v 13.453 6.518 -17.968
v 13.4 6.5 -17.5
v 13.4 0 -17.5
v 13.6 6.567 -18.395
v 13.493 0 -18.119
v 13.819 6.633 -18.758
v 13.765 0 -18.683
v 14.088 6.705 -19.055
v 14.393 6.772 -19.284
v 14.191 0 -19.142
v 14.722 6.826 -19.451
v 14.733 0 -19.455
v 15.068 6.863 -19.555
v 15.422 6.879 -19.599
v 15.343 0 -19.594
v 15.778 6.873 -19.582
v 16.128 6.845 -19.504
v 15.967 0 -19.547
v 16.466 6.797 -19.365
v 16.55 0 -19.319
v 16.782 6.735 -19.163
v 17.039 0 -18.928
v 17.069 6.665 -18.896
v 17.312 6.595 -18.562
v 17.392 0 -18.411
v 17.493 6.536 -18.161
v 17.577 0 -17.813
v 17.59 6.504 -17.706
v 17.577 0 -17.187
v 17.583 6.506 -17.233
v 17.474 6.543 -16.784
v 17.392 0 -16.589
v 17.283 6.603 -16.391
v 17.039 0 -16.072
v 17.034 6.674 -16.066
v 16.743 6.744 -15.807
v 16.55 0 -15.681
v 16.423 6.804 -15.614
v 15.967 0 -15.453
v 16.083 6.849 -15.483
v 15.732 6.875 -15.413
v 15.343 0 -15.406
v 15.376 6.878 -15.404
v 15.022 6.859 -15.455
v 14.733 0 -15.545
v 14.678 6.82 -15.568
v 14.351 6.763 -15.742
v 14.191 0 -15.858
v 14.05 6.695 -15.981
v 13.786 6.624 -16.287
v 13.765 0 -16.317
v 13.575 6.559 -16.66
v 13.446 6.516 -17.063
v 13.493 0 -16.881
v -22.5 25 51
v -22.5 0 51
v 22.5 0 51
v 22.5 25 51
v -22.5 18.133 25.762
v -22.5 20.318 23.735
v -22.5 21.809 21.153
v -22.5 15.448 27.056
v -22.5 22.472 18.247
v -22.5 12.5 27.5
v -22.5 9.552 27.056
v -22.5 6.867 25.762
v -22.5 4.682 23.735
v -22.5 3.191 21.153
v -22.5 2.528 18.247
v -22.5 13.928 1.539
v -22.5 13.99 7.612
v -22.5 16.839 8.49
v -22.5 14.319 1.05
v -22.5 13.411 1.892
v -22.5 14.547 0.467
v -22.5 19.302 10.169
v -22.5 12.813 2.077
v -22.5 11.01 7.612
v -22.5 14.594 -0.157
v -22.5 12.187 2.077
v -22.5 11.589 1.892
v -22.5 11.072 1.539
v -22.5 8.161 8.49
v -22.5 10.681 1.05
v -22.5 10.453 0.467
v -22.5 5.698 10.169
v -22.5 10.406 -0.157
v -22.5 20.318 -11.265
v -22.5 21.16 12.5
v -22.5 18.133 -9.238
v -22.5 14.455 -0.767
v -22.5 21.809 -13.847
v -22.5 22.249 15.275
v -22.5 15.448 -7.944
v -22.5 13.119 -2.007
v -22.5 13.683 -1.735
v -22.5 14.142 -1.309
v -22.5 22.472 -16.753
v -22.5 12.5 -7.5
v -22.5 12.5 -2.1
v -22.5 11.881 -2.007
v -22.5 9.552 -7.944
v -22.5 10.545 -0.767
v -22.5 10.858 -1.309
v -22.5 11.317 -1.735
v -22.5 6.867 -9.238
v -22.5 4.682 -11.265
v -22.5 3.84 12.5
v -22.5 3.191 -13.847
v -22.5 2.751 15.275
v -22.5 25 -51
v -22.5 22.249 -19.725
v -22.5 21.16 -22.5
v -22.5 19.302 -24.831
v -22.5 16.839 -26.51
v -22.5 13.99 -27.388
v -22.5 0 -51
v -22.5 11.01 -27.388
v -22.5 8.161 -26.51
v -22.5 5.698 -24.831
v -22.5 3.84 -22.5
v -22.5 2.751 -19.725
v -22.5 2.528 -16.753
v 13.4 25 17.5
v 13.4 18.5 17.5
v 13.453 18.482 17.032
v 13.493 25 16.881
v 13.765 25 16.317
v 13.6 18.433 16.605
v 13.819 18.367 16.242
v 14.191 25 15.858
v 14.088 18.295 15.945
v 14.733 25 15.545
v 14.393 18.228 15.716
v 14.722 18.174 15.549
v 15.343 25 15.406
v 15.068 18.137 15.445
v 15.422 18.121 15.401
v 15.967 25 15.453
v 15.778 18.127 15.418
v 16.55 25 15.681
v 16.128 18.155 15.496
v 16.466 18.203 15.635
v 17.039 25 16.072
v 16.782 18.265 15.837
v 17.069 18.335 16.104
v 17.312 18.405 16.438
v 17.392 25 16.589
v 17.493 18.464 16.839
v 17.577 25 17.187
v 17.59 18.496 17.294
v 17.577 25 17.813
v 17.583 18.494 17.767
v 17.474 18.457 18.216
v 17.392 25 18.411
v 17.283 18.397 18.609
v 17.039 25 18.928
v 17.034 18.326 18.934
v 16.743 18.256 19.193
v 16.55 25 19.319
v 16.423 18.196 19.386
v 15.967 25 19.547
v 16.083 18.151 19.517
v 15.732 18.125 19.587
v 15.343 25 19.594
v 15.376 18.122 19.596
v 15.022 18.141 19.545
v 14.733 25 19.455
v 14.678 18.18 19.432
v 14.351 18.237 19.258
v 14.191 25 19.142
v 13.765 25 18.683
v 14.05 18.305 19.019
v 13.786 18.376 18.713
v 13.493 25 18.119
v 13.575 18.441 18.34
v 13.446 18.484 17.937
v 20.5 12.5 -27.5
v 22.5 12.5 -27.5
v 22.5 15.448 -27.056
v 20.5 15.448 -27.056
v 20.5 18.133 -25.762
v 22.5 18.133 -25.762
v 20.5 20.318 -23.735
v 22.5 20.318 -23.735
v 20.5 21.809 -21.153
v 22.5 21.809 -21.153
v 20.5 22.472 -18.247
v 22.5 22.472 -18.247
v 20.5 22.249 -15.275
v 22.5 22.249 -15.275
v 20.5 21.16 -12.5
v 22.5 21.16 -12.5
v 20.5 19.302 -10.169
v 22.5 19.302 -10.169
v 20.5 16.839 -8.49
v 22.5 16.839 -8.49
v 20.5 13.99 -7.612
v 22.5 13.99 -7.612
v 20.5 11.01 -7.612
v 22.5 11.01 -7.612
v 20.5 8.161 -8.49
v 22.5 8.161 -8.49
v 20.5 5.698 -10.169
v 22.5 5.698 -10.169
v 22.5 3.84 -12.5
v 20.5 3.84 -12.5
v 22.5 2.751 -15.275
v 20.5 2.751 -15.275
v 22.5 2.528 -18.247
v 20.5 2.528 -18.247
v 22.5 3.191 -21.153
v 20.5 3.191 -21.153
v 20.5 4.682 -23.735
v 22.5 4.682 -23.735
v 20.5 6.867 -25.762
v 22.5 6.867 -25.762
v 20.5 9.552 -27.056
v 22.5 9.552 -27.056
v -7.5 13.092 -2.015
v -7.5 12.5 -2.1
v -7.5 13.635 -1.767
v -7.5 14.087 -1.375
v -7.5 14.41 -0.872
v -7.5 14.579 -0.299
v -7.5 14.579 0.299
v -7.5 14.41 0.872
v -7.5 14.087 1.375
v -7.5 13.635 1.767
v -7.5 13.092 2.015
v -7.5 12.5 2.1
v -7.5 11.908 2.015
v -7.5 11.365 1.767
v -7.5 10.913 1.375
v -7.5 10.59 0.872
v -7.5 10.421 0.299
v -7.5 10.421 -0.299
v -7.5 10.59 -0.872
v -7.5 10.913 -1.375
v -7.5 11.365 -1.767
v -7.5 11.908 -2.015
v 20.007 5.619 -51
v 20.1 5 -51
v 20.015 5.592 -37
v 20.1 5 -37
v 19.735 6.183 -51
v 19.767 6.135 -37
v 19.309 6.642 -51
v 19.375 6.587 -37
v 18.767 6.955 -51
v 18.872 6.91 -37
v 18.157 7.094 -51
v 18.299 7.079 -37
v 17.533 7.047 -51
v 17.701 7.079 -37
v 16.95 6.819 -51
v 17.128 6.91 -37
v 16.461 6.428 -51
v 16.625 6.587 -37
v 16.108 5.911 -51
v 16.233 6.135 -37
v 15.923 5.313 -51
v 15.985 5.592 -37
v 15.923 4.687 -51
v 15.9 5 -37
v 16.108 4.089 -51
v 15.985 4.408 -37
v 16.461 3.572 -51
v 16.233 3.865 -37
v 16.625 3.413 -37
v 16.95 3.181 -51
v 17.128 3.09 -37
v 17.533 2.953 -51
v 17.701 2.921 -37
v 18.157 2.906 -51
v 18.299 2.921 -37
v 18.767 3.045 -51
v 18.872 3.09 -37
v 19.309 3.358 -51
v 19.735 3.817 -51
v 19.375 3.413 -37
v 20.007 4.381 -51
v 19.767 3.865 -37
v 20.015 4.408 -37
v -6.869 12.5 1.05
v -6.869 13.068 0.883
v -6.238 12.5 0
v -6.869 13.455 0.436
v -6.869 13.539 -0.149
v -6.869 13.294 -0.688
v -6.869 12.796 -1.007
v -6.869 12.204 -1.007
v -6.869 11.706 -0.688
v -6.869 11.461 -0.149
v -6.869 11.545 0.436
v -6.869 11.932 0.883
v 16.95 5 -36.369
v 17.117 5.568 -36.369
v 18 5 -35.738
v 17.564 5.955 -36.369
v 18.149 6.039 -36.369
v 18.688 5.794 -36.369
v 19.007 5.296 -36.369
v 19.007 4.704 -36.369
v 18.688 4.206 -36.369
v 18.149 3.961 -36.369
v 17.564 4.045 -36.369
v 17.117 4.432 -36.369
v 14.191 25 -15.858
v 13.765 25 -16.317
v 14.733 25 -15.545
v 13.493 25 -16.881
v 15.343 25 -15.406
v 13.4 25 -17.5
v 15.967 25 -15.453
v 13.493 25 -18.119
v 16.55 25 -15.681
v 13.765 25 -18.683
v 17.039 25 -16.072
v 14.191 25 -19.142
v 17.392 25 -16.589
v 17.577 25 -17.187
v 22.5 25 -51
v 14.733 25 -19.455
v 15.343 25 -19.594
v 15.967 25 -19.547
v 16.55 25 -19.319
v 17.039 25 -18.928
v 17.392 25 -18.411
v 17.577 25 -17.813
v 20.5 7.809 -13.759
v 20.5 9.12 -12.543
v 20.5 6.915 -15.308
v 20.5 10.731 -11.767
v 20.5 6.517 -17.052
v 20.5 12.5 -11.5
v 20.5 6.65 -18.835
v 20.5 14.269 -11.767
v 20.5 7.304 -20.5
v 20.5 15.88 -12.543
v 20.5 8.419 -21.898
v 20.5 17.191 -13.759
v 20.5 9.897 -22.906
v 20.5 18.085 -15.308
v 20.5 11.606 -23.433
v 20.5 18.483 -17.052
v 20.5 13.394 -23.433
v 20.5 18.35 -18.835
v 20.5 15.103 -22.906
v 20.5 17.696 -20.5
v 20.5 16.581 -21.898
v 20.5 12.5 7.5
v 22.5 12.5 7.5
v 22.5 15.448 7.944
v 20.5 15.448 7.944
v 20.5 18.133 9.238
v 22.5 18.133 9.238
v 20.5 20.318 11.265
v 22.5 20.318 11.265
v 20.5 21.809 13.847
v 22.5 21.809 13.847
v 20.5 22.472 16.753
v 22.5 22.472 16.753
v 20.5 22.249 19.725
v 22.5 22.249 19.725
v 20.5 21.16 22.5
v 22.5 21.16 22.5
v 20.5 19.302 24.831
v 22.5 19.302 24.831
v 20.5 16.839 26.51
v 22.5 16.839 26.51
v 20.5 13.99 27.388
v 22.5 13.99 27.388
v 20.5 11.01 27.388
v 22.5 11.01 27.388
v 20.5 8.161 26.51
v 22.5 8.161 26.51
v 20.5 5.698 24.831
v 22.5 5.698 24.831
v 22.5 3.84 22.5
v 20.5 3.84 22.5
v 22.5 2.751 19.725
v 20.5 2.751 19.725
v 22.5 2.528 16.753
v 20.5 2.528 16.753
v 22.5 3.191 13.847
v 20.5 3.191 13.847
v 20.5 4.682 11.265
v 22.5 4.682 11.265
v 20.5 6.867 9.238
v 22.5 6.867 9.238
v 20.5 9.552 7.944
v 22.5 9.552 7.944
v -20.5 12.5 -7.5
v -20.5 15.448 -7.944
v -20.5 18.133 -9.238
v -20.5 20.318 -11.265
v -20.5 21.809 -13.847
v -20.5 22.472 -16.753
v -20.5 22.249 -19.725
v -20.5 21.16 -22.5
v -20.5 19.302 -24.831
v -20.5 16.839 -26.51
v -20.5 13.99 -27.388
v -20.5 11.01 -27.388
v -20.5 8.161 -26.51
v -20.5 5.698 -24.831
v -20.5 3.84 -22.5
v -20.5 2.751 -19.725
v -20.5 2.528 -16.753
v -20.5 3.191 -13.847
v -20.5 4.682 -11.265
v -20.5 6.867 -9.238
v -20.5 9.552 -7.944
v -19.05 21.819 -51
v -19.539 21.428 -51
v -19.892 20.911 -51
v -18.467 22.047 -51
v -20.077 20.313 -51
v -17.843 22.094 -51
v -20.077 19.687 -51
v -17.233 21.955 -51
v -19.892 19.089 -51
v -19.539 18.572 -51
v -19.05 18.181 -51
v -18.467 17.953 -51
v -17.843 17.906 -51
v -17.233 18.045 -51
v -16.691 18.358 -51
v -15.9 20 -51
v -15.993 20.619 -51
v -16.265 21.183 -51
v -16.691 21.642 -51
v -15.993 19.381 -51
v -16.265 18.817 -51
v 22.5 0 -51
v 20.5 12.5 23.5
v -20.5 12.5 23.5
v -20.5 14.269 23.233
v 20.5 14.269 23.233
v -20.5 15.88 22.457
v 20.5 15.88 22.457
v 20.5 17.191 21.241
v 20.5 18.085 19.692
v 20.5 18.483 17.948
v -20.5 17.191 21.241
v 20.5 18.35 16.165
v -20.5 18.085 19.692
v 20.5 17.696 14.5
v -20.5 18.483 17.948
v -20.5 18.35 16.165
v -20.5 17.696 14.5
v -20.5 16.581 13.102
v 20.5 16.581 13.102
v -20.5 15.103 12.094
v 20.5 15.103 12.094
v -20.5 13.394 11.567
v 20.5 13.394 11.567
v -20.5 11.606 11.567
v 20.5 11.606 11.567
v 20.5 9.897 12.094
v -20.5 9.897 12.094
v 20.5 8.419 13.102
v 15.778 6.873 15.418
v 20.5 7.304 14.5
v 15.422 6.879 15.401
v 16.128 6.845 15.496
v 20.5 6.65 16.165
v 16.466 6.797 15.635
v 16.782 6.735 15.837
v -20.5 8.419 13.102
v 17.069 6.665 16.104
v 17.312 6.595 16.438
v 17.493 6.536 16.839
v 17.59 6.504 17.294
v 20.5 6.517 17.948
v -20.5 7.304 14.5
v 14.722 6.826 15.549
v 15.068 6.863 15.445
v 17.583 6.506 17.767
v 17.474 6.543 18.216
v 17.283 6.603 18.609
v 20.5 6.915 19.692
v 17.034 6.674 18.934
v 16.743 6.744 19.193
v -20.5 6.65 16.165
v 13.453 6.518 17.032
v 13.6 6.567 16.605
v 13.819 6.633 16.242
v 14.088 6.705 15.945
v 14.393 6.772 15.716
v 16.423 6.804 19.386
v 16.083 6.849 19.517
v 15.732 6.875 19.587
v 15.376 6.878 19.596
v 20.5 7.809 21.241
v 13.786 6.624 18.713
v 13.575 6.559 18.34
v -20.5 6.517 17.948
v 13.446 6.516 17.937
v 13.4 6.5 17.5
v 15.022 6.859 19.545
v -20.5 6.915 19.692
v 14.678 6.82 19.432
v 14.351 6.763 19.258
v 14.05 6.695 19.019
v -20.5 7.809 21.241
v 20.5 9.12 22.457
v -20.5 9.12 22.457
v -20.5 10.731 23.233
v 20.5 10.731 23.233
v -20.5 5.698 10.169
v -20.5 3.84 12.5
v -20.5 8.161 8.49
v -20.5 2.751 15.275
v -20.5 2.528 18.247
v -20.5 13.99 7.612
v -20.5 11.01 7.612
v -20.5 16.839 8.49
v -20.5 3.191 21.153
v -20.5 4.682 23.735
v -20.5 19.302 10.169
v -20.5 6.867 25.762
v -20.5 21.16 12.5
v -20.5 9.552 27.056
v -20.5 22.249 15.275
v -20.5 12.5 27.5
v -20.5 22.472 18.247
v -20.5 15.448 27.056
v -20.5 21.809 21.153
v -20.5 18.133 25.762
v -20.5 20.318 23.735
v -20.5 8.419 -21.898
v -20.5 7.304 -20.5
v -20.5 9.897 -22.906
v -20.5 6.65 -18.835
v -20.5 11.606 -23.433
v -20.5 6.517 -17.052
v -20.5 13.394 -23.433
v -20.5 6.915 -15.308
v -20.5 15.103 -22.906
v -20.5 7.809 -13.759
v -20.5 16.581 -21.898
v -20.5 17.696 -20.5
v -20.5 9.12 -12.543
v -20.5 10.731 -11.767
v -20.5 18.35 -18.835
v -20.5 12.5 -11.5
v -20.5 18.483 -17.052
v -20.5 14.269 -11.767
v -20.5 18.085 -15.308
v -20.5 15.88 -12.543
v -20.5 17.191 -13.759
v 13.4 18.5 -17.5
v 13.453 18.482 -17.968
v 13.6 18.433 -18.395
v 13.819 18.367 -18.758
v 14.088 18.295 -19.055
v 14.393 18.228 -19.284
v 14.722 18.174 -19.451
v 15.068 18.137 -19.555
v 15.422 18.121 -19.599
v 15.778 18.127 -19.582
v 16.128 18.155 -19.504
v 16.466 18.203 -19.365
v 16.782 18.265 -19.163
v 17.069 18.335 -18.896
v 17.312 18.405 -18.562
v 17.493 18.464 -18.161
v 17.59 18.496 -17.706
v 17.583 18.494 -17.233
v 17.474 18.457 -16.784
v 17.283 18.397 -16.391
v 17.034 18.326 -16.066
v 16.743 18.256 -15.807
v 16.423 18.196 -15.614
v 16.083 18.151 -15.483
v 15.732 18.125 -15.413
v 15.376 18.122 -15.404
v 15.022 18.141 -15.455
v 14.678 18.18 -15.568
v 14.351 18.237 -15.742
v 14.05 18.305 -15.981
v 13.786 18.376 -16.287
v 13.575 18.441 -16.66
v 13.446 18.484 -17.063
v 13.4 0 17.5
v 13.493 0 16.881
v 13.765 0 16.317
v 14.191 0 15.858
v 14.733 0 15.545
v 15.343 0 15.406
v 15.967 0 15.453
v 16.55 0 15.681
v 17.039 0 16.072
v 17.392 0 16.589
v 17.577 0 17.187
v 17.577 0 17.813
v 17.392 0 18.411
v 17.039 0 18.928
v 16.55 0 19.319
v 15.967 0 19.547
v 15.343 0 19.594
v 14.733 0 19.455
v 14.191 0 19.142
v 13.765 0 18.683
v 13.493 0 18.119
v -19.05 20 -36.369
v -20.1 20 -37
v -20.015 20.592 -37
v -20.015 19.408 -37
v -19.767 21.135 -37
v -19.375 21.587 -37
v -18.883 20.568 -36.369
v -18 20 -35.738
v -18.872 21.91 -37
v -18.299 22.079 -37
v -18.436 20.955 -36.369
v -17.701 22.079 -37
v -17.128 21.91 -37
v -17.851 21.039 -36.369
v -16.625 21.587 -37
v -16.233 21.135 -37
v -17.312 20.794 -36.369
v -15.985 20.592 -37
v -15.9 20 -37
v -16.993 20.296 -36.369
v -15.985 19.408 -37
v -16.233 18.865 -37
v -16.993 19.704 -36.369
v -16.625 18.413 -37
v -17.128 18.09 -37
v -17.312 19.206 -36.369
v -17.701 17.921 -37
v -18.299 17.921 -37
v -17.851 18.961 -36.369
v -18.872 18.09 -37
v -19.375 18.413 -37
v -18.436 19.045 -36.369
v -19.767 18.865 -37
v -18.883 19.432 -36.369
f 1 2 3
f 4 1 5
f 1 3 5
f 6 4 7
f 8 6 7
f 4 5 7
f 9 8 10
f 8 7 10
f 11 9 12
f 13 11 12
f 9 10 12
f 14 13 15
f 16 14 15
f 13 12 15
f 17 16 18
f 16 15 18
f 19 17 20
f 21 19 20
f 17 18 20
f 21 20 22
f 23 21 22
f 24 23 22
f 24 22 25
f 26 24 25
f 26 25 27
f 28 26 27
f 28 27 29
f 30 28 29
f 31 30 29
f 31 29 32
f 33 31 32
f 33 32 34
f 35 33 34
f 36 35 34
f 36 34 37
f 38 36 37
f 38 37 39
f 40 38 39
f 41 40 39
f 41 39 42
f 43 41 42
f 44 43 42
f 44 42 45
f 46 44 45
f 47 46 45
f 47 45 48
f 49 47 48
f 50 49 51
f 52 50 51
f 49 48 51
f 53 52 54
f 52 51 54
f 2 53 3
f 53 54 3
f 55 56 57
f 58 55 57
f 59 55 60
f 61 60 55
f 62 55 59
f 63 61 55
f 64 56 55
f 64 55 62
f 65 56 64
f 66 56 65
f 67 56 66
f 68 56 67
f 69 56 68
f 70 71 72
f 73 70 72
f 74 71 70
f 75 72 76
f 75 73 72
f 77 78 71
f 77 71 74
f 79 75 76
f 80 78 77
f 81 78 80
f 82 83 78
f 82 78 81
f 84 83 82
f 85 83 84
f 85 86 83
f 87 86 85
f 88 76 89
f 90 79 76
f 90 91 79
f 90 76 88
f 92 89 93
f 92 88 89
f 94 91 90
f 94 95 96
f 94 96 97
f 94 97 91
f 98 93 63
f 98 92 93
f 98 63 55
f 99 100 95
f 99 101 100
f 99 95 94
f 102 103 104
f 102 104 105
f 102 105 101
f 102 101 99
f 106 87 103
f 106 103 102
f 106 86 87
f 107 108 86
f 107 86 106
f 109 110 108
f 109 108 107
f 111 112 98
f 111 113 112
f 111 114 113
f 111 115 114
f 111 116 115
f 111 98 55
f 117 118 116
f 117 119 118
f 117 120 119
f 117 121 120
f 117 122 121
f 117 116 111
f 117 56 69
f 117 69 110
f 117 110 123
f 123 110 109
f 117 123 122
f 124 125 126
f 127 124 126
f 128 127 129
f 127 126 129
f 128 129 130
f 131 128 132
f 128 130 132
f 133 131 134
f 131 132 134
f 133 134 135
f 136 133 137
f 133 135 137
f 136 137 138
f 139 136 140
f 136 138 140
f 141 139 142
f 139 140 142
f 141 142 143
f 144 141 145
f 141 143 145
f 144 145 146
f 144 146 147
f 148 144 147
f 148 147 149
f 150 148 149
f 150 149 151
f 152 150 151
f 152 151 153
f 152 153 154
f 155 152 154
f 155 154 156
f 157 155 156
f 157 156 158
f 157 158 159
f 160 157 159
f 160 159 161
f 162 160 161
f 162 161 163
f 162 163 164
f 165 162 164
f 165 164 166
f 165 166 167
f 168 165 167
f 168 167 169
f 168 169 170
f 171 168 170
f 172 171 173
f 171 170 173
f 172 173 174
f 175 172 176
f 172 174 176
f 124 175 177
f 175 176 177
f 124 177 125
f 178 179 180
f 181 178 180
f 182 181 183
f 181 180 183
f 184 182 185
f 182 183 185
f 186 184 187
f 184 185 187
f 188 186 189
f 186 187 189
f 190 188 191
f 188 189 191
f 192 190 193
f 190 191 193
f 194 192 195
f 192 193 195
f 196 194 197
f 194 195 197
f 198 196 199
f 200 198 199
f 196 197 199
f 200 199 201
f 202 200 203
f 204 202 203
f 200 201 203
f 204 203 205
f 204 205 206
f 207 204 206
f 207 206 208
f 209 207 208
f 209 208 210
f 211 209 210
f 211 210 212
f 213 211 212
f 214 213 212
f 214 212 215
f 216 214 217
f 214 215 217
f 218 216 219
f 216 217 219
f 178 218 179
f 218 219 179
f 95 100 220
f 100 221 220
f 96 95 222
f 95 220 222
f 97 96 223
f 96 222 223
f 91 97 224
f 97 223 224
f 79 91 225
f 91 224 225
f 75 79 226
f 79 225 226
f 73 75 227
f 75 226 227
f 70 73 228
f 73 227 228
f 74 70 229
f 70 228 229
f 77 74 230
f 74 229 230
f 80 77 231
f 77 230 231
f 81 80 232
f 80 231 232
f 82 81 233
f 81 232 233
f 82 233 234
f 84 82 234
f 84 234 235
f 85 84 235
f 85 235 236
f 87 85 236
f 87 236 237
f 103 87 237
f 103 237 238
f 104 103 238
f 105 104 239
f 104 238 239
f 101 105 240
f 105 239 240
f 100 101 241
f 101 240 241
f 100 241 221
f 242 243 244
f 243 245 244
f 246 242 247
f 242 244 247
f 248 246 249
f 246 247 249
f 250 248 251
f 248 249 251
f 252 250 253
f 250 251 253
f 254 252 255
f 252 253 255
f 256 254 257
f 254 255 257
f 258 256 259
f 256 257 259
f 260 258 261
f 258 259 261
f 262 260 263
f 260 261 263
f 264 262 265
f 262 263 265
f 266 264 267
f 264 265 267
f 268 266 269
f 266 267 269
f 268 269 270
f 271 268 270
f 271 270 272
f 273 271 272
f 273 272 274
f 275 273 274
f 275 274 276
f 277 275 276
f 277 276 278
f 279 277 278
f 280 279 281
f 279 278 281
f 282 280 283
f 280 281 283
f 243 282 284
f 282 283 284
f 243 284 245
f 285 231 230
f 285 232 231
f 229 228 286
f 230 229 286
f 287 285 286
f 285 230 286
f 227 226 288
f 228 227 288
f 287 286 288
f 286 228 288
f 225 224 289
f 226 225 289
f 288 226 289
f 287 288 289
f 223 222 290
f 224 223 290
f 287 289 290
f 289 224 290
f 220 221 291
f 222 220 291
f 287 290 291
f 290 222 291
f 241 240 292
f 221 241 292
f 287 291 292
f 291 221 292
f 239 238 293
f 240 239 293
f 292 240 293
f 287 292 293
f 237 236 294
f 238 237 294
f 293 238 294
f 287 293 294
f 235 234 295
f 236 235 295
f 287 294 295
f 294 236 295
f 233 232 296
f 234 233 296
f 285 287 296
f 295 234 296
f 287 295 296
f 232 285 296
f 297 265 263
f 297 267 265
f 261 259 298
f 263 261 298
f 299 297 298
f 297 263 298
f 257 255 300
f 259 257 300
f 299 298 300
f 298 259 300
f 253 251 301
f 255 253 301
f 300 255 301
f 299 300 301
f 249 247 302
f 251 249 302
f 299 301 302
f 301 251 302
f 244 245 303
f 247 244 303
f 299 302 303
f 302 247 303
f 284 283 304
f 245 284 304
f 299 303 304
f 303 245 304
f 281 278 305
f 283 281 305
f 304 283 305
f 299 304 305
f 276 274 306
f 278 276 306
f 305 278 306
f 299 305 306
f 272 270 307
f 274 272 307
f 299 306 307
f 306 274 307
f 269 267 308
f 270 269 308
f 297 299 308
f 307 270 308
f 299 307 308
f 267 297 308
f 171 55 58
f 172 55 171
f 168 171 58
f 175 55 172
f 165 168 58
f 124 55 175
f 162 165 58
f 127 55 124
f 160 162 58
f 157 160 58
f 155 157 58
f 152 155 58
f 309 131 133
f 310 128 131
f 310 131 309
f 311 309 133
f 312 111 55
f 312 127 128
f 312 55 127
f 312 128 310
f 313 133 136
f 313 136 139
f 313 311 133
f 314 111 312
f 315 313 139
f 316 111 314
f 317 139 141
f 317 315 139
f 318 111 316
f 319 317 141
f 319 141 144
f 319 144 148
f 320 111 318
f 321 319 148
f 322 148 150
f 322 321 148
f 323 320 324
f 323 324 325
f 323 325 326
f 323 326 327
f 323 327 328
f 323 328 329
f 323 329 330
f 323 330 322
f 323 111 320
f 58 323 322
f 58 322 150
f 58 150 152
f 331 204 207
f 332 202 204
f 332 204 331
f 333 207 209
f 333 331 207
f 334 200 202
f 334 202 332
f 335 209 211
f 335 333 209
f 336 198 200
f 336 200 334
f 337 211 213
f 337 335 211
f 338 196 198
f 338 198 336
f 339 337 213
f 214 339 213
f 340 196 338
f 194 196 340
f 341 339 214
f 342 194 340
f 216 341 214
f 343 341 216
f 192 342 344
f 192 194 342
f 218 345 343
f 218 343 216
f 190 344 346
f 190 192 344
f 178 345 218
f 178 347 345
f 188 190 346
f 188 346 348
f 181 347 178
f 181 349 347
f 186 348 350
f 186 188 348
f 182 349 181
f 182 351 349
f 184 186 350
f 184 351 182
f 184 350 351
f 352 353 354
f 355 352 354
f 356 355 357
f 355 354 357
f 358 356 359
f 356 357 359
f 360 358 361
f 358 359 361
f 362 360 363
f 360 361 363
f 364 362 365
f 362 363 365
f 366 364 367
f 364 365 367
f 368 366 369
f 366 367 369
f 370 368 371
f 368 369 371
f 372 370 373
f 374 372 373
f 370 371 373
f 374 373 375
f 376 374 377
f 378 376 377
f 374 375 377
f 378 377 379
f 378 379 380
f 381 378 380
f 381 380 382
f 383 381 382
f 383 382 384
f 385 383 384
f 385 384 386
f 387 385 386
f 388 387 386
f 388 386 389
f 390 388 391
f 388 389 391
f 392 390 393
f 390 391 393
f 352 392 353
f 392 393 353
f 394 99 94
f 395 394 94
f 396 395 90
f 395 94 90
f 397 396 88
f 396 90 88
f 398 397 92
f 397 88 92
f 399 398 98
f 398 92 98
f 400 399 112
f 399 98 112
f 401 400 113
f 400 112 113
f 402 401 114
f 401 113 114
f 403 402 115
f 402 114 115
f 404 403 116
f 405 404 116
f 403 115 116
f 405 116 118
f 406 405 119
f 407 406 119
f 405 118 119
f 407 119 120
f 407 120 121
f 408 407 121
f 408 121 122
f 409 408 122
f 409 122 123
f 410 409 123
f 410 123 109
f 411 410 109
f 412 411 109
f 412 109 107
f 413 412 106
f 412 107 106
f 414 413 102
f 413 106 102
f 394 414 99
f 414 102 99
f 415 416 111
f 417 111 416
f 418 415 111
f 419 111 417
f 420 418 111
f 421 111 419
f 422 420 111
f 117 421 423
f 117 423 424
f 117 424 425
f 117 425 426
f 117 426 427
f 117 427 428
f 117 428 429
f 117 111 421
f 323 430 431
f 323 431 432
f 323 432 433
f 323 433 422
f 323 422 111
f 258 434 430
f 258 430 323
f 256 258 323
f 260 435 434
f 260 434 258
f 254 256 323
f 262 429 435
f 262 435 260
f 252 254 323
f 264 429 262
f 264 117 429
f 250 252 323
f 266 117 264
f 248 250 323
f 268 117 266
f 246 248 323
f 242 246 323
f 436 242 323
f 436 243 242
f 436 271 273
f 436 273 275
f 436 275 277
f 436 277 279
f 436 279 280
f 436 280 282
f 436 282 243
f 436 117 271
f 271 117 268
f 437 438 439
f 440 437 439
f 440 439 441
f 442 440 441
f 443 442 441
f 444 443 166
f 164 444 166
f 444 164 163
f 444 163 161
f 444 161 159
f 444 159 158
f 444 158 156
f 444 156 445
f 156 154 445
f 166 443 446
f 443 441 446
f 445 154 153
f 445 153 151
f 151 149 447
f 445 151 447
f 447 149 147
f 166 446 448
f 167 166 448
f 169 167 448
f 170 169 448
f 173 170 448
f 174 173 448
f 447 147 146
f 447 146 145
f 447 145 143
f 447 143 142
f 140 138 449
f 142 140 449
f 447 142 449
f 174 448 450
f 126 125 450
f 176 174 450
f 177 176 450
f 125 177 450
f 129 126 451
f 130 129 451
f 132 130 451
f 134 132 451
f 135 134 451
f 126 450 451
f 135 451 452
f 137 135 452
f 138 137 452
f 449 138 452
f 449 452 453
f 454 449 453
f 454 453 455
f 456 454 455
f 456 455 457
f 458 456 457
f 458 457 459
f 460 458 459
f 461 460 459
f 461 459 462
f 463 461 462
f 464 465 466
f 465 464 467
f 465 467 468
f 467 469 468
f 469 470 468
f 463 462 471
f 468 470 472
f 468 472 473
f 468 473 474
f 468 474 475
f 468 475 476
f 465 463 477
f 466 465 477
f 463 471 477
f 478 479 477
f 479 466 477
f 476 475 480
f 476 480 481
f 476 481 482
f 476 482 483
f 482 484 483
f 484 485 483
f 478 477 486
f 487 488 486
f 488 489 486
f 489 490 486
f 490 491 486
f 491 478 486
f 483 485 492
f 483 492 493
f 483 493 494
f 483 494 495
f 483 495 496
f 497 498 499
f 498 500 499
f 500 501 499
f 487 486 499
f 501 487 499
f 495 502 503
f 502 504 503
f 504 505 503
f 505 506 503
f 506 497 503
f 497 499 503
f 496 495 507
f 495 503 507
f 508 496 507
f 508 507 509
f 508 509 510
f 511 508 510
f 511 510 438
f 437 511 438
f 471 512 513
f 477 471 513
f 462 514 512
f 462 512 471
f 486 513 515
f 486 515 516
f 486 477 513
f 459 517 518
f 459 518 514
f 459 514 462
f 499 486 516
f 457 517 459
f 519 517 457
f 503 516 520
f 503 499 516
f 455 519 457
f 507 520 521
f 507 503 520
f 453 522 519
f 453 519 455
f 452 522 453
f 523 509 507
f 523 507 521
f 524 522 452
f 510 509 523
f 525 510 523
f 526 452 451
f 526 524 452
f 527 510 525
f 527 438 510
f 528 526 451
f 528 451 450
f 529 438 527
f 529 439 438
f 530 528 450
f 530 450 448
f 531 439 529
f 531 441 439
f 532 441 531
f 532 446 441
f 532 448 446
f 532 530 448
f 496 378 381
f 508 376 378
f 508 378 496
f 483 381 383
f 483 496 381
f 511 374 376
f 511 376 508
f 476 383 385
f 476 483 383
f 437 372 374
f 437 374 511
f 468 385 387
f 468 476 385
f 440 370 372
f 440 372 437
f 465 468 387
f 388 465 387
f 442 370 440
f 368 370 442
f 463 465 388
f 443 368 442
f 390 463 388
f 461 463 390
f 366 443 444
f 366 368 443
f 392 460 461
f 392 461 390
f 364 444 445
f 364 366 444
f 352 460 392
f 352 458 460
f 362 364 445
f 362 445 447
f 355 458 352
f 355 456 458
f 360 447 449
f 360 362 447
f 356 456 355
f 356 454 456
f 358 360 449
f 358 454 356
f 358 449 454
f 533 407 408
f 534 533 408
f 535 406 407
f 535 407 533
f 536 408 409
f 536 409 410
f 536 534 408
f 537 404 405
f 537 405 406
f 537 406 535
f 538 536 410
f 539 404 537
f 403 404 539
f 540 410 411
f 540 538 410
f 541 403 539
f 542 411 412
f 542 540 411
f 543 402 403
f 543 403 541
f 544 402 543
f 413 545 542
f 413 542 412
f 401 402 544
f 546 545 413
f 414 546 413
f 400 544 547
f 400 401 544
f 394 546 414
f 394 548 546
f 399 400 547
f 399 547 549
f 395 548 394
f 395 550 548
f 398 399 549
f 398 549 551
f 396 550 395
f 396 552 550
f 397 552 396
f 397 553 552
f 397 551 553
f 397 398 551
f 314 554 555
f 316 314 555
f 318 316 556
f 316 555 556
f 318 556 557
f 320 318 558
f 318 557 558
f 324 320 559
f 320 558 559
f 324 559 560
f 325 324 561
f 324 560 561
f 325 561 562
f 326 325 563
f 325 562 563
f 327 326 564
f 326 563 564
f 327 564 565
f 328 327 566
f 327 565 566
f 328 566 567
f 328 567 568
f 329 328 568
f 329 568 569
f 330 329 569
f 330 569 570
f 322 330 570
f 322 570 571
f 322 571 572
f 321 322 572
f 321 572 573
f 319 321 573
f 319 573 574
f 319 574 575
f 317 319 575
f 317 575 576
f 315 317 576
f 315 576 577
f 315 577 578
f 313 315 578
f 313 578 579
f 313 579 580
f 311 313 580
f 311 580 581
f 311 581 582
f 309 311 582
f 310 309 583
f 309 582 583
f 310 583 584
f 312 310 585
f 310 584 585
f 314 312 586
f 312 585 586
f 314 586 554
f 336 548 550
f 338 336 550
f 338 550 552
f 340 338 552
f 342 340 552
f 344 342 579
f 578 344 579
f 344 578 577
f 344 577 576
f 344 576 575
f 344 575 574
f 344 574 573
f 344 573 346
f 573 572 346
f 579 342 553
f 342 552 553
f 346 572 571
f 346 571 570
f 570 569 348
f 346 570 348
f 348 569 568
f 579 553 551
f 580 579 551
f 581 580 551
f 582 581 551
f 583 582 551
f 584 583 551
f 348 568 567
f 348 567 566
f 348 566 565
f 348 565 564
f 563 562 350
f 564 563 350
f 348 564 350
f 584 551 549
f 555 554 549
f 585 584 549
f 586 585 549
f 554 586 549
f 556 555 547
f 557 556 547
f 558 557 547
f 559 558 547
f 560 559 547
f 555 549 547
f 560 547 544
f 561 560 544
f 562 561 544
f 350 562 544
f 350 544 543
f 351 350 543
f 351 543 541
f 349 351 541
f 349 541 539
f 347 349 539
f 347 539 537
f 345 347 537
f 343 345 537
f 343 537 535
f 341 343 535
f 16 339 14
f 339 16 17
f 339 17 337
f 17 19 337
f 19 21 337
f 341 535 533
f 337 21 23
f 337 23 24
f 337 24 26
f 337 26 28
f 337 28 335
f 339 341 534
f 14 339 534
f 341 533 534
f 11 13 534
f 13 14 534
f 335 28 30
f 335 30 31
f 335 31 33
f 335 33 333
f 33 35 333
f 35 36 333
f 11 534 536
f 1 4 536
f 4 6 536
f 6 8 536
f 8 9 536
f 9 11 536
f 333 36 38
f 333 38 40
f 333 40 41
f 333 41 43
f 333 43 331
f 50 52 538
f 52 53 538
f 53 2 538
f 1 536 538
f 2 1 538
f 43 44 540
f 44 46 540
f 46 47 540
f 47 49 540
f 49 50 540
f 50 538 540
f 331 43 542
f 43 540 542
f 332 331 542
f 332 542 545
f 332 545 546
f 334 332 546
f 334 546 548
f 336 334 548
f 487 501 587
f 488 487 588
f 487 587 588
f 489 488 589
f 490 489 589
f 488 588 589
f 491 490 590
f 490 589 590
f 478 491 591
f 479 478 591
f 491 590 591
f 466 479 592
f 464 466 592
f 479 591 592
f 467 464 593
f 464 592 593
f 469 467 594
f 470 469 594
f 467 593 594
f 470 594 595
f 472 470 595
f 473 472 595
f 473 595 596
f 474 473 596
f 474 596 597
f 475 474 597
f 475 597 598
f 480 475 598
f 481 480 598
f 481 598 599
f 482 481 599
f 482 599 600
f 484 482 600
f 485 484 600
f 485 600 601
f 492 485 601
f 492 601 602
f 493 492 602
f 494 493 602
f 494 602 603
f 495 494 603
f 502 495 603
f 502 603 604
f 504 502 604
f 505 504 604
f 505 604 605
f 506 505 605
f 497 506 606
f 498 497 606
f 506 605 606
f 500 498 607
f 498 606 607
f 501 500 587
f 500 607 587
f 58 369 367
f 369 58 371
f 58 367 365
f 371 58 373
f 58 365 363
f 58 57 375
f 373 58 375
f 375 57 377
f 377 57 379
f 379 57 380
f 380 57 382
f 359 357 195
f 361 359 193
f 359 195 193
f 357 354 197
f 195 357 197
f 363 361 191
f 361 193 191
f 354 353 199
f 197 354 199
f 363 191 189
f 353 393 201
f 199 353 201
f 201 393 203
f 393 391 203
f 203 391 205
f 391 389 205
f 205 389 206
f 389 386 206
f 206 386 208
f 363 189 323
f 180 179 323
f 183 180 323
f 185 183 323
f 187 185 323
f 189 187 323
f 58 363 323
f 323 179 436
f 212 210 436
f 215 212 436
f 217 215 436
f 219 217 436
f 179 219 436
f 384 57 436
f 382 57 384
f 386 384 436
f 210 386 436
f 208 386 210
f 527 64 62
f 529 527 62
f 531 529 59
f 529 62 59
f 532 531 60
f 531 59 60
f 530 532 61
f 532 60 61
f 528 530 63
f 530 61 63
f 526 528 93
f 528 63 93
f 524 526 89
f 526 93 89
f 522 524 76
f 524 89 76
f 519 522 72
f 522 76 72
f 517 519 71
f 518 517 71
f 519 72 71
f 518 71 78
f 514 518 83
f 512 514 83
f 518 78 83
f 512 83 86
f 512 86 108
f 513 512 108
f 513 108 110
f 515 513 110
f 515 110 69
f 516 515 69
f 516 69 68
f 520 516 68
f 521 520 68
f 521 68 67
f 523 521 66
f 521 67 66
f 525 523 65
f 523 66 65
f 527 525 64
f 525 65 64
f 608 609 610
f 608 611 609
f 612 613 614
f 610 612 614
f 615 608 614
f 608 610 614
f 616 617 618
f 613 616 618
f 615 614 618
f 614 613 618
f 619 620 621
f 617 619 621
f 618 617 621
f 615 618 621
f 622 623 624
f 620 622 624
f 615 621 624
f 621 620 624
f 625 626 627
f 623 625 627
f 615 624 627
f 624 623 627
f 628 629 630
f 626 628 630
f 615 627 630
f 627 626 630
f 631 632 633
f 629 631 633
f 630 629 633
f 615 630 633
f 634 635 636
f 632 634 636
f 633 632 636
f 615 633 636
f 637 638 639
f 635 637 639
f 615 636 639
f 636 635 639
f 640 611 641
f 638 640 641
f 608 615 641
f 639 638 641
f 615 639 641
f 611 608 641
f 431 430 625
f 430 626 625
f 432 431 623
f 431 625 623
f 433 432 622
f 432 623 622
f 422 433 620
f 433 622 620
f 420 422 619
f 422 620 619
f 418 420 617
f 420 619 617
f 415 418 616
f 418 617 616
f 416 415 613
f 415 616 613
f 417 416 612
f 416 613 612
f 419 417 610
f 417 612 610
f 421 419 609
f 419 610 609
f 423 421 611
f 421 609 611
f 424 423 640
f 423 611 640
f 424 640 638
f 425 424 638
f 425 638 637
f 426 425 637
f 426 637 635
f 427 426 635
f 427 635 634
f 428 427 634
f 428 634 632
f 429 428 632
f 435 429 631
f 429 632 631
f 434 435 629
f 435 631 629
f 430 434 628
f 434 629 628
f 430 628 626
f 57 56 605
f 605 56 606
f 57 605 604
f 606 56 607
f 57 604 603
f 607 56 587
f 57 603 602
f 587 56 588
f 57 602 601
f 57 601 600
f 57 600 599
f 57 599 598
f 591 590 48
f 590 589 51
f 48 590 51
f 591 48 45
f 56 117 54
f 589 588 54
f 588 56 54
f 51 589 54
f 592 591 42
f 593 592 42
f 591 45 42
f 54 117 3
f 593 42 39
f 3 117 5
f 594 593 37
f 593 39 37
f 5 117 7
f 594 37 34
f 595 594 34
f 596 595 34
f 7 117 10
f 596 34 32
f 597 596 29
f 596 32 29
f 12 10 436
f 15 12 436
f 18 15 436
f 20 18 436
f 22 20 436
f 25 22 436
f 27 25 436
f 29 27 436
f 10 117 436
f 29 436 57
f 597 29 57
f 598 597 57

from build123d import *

# Parameters (mm, degrees)
SKETCH1_W             = 45
SKETCH1_H             = 102
BOSS_EXTRUDE1_DEPTH   = 25
M5_TAPPED_HOLE3_D     = 4.2
SKETCH27_R            = 6
CUT_EXTRUDE1_DEPTH    = 74
SKETCH28_R            = 10
CUT_EXTRUDE3_DEPTH    = 2
SKETCH30_R            = 10
CUT_EXTRUDE4_DEPTH    = 2
M5_TAPPED_HOLE4_D     = 4.2
M5_TAPPED_HOLE4_DEPTH = 14
M5_TAPPED_HOLE4_TIP   = 1.2618073
M5_TAPPED_HOLE5_D     = 4.2
M5_TAPPED_HOLE5_DEPTH = 15
M5_TAPPED_HOLE5_TIP   = 1.2618073


with BuildPart() as part:
    # Sketch1 → Boss-Extrude1 (new body)
    with BuildSketch(Plane(origin=(0, 0, 0), x_dir=(1, 0, 0), z_dir=(0, 1, 0))):
        Rectangle(SKETCH1_W, SKETCH1_H)
    extrude(amount=BOSS_EXTRUDE1_DEPTH)

    # M5 Tapped Hole3 (through all)
    with Locations(Plane(origin=(0, 25, 0), x_dir=(1, 0, 0), z_dir=(0, 1, 0))):
        with Locations((15.5, 17.5), (15.5, -17.5)):
            Hole(M5_TAPPED_HOLE3_D / 2)

    # Sketch27 → Cut-Extrude1 (cut)
    with BuildSketch(Plane.ZY.offset(22.5)):
        with Locations((-17.5, 12.5)):
            Circle(SKETCH27_R)
        with Locations((17.5, 12.5)):
            Circle(SKETCH27_R)
    extrude(amount=-CUT_EXTRUDE1_DEPTH, mode=Mode.SUBTRACT)

    # Sketch28 → Cut-Extrude3 (cut)
    with BuildSketch(Plane.ZY.offset(22.5)):
        with Locations((-17.5, 12.5)):
            Circle(SKETCH28_R)
        with Locations((17.5, 12.5)):
            Circle(SKETCH28_R)
    extrude(amount=-CUT_EXTRUDE3_DEPTH, mode=Mode.SUBTRACT)

    # Sketch30 → Cut-Extrude4 (cut)
    with BuildSketch(Plane(origin=(22.5, 0, 0), x_dir=(0, 0, -1), z_dir=(1, 0, 0))):
        with Locations((-17.5, 12.5)):
            Circle(SKETCH30_R)
        with Locations((17.5, 12.5)):
            Circle(SKETCH30_R)
    extrude(amount=-CUT_EXTRUDE4_DEPTH, mode=Mode.SUBTRACT)

    # M5 Tapped Hole4
    with Locations(Plane(origin=(0, 0, -51), x_dir=(-1, 0, 0), z_dir=(0, 0, -1))):
        with Locations((-18, 5), (18, 20)):
            Hole(M5_TAPPED_HOLE4_D / 2, depth=M5_TAPPED_HOLE4_DEPTH)
            with Locations((0, 0, -(M5_TAPPED_HOLE4_DEPTH + M5_TAPPED_HOLE4_TIP / 2))):  # 118° drill point
                Cone(0, M5_TAPPED_HOLE4_D / 2, M5_TAPPED_HOLE4_TIP, mode=Mode.SUBTRACT)

    # M5 Tapped Hole5
    with Locations(Plane.ZY.offset(22.5)):
        with Locations((0, 12.5)):
            Hole(M5_TAPPED_HOLE5_D / 2, depth=M5_TAPPED_HOLE5_DEPTH)
            with Locations((0, 0, -(M5_TAPPED_HOLE5_DEPTH + M5_TAPPED_HOLE5_TIP / 2))):  # 118° drill point
                Cone(0, M5_TAPPED_HOLE5_D / 2, M5_TAPPED_HOLE5_TIP, mode=Mode.SUBTRACT)


solid = part.part
